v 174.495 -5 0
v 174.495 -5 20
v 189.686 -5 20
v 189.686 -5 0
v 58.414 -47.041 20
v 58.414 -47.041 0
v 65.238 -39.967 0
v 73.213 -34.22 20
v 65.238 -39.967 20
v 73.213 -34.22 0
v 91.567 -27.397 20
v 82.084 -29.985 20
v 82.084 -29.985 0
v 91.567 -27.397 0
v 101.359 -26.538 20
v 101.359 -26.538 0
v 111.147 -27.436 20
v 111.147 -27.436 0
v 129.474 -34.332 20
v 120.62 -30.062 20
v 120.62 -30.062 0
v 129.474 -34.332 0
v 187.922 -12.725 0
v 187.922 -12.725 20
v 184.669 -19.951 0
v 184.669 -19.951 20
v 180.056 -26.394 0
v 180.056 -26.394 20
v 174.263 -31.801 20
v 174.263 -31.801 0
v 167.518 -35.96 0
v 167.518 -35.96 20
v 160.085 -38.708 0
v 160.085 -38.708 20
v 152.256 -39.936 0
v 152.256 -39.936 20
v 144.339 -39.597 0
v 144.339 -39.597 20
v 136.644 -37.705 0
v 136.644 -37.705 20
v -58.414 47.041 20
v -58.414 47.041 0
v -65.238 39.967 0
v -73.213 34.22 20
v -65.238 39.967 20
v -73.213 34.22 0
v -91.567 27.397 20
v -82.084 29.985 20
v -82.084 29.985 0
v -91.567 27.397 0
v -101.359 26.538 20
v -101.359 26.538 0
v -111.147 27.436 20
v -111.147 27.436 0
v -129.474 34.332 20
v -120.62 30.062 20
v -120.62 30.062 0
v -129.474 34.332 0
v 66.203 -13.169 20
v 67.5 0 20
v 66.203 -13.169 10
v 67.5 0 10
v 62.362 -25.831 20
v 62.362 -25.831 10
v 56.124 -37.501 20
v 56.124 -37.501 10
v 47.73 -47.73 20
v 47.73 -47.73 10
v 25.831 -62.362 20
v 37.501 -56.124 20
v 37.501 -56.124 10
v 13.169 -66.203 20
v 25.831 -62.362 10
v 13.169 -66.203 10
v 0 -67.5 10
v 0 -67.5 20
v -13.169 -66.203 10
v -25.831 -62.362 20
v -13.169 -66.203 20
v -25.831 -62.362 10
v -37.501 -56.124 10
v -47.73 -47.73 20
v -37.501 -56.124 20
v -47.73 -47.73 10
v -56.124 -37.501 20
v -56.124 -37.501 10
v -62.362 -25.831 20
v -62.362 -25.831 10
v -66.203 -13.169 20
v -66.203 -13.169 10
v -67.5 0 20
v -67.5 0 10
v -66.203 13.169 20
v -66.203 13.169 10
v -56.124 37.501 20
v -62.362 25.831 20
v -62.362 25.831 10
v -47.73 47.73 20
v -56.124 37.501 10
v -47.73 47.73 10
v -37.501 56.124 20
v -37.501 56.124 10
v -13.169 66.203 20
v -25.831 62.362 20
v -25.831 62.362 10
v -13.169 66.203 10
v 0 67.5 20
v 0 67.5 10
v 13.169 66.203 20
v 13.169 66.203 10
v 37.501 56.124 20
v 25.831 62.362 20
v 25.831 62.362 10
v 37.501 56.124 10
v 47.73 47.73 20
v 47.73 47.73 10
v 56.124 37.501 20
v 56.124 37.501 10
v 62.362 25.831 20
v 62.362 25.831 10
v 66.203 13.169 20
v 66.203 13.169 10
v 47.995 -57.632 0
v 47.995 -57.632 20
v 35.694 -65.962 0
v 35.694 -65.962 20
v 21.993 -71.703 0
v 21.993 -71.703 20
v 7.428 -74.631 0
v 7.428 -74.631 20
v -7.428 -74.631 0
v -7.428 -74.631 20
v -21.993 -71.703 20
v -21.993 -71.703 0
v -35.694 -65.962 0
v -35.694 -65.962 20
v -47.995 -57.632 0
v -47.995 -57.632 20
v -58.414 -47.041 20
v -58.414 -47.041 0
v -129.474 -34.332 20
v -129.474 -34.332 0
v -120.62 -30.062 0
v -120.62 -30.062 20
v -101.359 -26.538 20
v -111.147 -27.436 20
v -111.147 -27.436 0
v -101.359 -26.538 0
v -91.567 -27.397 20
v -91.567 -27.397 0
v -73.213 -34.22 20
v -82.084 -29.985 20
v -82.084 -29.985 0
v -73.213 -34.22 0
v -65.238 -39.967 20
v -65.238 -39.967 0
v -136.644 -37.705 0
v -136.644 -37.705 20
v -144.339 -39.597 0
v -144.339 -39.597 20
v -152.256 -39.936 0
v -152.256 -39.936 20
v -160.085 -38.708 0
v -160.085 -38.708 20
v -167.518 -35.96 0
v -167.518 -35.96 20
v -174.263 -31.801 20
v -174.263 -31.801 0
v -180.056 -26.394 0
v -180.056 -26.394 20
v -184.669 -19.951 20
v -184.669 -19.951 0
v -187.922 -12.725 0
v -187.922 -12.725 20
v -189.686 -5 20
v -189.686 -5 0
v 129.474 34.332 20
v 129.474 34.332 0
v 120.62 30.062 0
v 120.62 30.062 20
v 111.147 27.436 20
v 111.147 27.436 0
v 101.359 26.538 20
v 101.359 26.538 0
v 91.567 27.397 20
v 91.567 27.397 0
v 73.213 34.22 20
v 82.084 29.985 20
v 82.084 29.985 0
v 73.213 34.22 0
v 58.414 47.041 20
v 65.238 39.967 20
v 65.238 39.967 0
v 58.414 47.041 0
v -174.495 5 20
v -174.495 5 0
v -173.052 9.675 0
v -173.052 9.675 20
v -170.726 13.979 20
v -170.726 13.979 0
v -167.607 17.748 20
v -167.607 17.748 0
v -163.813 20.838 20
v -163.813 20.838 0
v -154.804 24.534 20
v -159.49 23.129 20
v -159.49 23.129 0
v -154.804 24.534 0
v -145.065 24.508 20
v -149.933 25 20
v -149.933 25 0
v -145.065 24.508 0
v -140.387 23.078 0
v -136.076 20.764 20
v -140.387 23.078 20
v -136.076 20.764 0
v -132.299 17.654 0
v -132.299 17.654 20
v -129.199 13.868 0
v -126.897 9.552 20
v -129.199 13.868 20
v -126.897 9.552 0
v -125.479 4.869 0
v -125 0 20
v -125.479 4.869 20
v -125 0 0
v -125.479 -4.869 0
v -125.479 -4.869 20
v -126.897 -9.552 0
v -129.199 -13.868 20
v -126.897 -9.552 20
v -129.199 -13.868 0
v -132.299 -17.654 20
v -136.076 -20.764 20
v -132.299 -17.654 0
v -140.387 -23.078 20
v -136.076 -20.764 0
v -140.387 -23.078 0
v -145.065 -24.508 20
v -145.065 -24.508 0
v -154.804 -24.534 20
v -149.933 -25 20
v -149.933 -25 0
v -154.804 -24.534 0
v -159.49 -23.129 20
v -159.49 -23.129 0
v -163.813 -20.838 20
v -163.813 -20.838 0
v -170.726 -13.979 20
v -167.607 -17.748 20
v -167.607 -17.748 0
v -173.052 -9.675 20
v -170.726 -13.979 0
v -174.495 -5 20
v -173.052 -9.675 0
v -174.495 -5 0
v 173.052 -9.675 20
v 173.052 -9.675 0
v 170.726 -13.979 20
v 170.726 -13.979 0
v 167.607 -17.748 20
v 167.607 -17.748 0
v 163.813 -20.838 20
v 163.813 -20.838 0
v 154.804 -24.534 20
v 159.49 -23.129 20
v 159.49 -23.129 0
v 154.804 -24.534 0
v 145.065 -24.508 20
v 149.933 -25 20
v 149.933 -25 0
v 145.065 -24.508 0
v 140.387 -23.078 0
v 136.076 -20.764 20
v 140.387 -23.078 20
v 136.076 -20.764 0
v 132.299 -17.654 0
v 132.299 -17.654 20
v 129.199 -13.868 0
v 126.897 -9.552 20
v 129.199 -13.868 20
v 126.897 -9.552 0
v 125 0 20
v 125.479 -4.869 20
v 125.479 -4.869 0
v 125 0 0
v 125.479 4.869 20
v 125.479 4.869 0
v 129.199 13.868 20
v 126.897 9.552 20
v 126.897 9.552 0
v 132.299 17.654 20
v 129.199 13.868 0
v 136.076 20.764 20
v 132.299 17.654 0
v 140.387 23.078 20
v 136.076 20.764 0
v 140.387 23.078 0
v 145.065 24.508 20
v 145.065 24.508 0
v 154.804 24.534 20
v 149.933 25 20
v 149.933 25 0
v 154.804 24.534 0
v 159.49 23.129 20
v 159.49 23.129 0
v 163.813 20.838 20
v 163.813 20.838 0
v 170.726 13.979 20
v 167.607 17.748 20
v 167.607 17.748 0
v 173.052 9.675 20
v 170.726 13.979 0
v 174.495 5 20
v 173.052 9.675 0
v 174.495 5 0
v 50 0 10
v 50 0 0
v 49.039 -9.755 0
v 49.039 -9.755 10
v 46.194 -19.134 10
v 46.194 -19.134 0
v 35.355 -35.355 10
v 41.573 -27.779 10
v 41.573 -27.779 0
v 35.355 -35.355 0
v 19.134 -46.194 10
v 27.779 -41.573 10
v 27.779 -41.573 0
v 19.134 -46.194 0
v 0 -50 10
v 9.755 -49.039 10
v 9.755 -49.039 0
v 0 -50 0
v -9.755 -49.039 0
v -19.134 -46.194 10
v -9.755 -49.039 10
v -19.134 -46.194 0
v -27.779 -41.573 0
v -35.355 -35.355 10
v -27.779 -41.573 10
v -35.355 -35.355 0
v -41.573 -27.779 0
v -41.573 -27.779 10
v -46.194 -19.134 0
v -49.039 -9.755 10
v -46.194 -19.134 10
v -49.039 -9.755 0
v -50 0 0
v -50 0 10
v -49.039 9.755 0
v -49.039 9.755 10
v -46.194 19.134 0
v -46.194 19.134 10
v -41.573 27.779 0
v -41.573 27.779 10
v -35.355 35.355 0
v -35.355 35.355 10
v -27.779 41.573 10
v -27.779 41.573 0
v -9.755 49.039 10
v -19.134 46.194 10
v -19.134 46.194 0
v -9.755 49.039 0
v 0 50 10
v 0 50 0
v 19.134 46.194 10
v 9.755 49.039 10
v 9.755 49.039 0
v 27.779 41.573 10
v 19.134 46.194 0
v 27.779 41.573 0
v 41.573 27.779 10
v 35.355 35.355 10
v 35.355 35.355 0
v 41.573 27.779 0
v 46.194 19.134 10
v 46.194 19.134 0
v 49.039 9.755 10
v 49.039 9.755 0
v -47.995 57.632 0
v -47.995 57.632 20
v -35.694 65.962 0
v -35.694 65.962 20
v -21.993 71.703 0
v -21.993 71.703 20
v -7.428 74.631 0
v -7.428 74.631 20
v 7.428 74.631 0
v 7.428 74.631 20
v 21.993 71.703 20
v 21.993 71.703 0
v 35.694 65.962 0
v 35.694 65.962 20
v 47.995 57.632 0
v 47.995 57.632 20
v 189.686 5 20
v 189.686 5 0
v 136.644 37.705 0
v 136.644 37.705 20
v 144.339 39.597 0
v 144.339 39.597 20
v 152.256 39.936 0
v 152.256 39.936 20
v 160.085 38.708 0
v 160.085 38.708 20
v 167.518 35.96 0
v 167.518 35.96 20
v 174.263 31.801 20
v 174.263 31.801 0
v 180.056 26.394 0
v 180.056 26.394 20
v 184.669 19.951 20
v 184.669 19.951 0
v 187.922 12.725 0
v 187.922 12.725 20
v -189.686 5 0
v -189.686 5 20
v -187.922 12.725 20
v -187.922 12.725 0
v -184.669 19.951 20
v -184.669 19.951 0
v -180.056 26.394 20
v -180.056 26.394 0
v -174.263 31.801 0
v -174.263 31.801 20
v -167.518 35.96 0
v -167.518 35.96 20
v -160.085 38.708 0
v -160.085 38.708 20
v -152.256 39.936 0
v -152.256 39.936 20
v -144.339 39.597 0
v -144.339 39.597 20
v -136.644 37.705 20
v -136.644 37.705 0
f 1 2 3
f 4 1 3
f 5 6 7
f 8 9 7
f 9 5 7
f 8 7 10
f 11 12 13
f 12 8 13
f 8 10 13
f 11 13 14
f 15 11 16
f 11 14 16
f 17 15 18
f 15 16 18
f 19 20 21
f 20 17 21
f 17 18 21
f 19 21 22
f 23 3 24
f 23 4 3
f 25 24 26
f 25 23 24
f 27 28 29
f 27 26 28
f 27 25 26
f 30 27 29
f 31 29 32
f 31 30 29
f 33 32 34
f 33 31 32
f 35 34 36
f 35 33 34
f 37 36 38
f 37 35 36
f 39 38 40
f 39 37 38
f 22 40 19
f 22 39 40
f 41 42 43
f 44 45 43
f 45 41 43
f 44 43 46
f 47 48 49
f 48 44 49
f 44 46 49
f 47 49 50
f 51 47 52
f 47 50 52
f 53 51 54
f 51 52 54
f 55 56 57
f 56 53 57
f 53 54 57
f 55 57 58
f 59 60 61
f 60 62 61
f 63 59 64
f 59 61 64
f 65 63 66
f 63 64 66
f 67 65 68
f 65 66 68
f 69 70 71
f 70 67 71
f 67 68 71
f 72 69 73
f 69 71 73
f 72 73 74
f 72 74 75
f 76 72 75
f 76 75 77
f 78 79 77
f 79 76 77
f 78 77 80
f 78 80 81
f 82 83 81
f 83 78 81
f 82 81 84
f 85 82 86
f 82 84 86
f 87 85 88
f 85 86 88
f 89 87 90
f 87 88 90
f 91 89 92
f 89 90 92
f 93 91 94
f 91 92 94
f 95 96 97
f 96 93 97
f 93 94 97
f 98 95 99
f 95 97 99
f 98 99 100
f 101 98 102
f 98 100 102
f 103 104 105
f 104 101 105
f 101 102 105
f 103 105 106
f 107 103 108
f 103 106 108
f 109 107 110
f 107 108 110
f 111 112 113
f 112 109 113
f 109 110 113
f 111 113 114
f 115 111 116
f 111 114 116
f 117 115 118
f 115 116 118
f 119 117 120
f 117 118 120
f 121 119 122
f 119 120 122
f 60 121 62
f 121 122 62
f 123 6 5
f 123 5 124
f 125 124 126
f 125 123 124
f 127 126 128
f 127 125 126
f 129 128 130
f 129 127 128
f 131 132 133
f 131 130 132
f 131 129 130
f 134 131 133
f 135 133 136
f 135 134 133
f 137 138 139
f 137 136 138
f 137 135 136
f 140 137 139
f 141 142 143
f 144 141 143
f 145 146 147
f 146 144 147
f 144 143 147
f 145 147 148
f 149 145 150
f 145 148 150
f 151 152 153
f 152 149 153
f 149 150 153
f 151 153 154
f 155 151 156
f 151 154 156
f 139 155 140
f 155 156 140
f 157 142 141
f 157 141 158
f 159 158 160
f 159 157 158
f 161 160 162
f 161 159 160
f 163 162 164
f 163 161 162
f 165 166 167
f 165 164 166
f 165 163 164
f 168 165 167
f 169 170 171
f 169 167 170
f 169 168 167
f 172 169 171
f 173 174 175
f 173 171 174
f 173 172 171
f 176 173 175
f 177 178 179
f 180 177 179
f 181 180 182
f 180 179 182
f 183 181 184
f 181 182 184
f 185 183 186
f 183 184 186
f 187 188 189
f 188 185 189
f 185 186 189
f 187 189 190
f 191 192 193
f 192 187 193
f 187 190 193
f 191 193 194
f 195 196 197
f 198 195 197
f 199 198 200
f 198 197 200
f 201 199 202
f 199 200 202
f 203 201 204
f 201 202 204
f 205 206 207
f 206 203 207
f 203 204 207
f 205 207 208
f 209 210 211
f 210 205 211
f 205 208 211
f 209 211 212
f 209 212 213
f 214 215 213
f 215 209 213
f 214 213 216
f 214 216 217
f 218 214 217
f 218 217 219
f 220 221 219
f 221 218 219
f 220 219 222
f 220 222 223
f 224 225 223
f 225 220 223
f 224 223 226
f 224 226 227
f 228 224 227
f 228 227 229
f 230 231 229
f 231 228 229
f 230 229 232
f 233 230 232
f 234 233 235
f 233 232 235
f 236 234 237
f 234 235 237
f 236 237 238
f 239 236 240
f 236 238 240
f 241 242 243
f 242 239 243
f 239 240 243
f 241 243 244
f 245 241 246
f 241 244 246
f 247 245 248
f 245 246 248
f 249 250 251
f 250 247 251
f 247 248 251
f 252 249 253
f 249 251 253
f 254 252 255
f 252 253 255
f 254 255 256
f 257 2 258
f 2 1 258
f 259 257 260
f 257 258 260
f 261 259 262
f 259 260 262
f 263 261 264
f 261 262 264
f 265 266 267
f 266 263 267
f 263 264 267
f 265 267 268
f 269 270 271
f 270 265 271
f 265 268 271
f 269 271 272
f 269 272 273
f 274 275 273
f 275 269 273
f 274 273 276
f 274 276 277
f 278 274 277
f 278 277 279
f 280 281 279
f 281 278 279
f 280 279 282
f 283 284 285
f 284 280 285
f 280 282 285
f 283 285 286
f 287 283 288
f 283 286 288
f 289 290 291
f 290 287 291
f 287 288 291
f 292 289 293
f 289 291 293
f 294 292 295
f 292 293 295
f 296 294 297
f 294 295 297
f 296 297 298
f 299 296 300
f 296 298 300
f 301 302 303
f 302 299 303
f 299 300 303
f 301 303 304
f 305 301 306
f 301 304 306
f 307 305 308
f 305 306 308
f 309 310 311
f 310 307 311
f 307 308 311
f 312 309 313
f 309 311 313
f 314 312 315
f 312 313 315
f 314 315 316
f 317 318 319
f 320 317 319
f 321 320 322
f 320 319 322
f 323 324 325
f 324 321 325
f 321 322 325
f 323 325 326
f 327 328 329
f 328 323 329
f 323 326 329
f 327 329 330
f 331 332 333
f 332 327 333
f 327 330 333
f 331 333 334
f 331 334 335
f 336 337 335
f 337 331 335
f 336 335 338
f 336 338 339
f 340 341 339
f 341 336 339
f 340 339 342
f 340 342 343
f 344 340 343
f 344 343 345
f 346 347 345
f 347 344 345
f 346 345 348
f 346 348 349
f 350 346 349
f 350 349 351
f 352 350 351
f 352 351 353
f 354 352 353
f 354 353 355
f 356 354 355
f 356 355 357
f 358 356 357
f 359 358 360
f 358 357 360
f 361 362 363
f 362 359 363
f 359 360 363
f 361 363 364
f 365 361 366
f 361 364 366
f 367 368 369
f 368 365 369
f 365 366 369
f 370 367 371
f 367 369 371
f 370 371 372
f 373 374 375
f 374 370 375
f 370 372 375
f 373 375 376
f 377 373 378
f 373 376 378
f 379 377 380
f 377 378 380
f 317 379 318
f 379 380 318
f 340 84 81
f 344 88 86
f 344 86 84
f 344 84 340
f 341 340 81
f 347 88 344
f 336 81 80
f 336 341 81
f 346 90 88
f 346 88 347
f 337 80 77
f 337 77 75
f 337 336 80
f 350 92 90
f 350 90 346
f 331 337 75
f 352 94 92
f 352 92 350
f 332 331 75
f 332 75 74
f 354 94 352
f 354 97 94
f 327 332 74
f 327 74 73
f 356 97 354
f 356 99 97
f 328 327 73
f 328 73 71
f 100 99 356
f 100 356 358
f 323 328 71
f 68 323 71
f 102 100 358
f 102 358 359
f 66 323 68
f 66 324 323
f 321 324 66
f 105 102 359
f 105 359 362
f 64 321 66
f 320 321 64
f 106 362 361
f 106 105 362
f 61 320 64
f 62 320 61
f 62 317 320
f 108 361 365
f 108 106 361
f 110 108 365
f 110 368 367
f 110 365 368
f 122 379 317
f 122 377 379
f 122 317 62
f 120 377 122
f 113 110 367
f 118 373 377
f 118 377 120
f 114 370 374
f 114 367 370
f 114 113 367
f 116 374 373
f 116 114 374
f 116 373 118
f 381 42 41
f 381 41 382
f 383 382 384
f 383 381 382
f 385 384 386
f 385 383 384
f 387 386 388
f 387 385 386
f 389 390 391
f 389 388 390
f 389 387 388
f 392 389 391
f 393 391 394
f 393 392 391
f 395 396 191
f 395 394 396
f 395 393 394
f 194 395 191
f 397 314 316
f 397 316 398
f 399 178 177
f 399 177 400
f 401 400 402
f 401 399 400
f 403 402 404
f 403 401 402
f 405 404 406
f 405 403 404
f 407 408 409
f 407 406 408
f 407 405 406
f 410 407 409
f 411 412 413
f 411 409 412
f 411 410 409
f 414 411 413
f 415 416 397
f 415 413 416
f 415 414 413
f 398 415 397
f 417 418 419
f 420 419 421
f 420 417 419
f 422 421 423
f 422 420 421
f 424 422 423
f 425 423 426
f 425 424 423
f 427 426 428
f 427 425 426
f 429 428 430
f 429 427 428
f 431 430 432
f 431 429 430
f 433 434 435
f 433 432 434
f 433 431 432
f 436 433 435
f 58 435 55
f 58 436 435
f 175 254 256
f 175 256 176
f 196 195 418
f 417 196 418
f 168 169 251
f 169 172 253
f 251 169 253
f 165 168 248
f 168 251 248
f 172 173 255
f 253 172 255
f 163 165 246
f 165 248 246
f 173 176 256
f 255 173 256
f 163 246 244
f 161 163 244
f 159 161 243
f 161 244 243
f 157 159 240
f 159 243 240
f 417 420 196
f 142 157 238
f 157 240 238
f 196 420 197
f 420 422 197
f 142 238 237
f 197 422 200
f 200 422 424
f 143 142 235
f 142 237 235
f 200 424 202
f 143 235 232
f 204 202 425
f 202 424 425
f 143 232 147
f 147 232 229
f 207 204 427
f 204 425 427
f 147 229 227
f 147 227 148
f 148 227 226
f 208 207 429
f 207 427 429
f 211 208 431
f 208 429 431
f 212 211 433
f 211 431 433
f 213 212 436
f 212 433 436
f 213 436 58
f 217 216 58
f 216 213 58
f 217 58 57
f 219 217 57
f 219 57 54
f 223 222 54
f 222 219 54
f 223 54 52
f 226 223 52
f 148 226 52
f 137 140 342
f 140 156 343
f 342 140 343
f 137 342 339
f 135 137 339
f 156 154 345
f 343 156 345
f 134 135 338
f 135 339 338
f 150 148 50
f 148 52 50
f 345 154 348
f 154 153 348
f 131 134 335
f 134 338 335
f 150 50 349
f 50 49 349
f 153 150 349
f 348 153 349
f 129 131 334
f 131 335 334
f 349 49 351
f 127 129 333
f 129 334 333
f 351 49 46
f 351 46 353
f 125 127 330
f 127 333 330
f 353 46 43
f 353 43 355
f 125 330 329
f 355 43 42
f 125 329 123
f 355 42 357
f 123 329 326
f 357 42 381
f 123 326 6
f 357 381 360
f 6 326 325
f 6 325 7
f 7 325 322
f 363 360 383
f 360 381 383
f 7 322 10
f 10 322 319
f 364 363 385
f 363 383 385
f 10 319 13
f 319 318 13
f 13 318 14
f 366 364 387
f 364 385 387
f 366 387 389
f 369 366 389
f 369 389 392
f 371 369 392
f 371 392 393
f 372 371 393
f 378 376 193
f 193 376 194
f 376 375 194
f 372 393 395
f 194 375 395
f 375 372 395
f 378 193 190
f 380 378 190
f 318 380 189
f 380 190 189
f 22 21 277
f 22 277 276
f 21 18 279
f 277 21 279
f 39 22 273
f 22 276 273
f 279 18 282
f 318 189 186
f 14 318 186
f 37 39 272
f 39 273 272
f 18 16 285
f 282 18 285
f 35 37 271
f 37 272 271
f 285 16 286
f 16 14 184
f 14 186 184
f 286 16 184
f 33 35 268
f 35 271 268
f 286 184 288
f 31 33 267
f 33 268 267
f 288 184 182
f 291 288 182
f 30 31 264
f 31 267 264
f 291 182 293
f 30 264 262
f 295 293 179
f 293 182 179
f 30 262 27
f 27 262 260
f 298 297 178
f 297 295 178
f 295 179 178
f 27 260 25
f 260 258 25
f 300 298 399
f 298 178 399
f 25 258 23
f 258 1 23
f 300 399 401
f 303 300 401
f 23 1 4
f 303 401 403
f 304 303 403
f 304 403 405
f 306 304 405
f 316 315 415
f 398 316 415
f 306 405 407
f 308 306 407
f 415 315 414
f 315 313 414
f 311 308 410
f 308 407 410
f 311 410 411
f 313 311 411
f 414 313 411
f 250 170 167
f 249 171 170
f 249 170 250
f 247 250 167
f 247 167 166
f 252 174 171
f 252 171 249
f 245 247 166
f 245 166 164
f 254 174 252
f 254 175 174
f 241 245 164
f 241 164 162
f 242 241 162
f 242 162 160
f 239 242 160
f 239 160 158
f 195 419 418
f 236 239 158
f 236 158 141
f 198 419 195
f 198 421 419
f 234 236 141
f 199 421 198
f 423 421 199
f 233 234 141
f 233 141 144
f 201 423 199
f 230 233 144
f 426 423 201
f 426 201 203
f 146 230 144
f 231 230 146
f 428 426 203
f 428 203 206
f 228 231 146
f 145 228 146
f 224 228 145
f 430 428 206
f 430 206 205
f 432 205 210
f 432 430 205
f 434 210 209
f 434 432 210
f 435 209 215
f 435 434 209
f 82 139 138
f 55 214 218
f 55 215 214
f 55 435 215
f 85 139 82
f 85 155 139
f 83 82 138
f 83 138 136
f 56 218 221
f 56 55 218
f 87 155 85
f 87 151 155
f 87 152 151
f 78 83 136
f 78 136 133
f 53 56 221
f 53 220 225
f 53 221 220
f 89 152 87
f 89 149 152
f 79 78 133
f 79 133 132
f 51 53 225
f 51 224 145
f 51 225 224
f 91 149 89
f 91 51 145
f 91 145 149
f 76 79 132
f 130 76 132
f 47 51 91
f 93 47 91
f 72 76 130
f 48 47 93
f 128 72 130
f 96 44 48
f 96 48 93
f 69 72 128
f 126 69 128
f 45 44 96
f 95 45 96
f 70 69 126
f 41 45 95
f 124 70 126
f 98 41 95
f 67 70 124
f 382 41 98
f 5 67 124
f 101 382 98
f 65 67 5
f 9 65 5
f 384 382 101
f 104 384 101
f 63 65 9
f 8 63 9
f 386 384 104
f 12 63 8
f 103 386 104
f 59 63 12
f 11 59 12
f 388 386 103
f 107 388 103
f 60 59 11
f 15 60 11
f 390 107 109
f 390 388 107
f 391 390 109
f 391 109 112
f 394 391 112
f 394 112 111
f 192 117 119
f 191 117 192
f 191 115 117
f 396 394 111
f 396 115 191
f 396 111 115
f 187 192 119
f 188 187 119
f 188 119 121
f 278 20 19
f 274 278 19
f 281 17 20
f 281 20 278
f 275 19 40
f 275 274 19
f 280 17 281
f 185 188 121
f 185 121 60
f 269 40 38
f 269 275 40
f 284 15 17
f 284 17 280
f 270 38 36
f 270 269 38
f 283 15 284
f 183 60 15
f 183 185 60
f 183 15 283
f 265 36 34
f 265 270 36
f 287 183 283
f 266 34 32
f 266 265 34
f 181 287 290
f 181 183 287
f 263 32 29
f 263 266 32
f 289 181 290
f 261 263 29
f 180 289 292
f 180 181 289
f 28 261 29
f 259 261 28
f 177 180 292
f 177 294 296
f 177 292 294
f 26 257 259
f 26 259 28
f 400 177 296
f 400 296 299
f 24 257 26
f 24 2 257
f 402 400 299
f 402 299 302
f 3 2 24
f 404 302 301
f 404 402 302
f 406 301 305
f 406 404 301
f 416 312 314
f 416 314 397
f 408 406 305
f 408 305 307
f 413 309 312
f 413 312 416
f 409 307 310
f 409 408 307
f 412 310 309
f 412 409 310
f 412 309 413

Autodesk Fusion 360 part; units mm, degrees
sketch "Sketch2" plane through (0, 0, 0) normal (0, 0, 1) x (1, 0, 0)
  circle A0 centre (0, 0) radius 50
  circle A1 centre (0, 0) radius 67.5
  line L0 (0, 0) -> (150, 0) construction
  line L1 (0, 0) -> (-150, 0) construction
  line L2 (-150, 0) -> (-150, 5) construction
  line L3 (-150, 0) -> (-150, -5) construction
  line L4 (-174.4949, 5) -> (-189.6863, 5)
  line L5 (-174.4949, -5) -> (-189.6863, -5)
  line L6 (150, 0) -> (150, 5) construction
  line L7 (150, 0) -> (150, -5) construction
  line L8 (174.4949, 5) -> (189.6863, 5)
  line L9 (174.4949, -5) -> (189.6863, -5)
  arc A2 (-174.4949, -5) -> (-174.4949, 5) centre (-150, 0) ccw
  arc A3 (174.4949, 5) -> (174.4949, -5) centre (150, 0) ccw
  arc A4 (-129.4737, 34.3318) -> (-58.4135, 47.0411) centre (-101.25, 81.538) ccw
  arc A5 (-58.4135, -47.0411) -> (-129.4737, -34.3318) centre (-101.25, -81.538) ccw
  arc A6 (129.4737, -34.3318) -> (58.4135, -47.0411) centre (101.25, -81.538) ccw
  arc A7 (58.4135, 47.0411) -> (129.4737, 34.3318) centre (101.25, 81.538) ccw
  arc A8 (-189.6863, -5) -> (-129.4737, -34.3318) centre (-150, 0) ccw
  arc A9 (-129.4737, 34.3318) -> (-189.6863, 5) centre (-150, 0) ccw
  arc A10 (189.6863, 5) -> (129.4737, 34.3318) centre (150, 0) ccw
  arc A11 (129.4737, -34.3318) -> (189.6863, -5) centre (150, 0) ccw
  arc A12 (-58.4135, -47.0411) -> (58.4135, -47.0411) centre (0, 0) ccw
  arc A13 (58.4135, 47.0411) -> (-58.4135, 47.0411) centre (0, 0) ccw
  dimension "d13" = 100
  dimension "d14" = 135
  dimension "d15" = 150
  dimension "d16" = 150
  dimension "d17" = 150
  dimension "d18" = 50
  dimension "d19" = 80
  dimension "d20" = 50
  dimension "d21" = 80
  dimension "d22" = 5
  dimension "d23" = 5
  dimension "d24" = 5
  dimension "d25" = 5
  dimension "d26" = 110
  dimension "d27" = 110
  dimension "d28" = 110
  dimension "d30" = 110
extrude "Extrude2" add sketch "Sketch2" along normal blind 10 contours A1
extrude "Extrude3" add sketch "Sketch2" along normal blind 20 contours L4 L5 L8 L9 A2 A3 A4 A5 A6 A7 A8 A9 A10 A11 A12 A13
